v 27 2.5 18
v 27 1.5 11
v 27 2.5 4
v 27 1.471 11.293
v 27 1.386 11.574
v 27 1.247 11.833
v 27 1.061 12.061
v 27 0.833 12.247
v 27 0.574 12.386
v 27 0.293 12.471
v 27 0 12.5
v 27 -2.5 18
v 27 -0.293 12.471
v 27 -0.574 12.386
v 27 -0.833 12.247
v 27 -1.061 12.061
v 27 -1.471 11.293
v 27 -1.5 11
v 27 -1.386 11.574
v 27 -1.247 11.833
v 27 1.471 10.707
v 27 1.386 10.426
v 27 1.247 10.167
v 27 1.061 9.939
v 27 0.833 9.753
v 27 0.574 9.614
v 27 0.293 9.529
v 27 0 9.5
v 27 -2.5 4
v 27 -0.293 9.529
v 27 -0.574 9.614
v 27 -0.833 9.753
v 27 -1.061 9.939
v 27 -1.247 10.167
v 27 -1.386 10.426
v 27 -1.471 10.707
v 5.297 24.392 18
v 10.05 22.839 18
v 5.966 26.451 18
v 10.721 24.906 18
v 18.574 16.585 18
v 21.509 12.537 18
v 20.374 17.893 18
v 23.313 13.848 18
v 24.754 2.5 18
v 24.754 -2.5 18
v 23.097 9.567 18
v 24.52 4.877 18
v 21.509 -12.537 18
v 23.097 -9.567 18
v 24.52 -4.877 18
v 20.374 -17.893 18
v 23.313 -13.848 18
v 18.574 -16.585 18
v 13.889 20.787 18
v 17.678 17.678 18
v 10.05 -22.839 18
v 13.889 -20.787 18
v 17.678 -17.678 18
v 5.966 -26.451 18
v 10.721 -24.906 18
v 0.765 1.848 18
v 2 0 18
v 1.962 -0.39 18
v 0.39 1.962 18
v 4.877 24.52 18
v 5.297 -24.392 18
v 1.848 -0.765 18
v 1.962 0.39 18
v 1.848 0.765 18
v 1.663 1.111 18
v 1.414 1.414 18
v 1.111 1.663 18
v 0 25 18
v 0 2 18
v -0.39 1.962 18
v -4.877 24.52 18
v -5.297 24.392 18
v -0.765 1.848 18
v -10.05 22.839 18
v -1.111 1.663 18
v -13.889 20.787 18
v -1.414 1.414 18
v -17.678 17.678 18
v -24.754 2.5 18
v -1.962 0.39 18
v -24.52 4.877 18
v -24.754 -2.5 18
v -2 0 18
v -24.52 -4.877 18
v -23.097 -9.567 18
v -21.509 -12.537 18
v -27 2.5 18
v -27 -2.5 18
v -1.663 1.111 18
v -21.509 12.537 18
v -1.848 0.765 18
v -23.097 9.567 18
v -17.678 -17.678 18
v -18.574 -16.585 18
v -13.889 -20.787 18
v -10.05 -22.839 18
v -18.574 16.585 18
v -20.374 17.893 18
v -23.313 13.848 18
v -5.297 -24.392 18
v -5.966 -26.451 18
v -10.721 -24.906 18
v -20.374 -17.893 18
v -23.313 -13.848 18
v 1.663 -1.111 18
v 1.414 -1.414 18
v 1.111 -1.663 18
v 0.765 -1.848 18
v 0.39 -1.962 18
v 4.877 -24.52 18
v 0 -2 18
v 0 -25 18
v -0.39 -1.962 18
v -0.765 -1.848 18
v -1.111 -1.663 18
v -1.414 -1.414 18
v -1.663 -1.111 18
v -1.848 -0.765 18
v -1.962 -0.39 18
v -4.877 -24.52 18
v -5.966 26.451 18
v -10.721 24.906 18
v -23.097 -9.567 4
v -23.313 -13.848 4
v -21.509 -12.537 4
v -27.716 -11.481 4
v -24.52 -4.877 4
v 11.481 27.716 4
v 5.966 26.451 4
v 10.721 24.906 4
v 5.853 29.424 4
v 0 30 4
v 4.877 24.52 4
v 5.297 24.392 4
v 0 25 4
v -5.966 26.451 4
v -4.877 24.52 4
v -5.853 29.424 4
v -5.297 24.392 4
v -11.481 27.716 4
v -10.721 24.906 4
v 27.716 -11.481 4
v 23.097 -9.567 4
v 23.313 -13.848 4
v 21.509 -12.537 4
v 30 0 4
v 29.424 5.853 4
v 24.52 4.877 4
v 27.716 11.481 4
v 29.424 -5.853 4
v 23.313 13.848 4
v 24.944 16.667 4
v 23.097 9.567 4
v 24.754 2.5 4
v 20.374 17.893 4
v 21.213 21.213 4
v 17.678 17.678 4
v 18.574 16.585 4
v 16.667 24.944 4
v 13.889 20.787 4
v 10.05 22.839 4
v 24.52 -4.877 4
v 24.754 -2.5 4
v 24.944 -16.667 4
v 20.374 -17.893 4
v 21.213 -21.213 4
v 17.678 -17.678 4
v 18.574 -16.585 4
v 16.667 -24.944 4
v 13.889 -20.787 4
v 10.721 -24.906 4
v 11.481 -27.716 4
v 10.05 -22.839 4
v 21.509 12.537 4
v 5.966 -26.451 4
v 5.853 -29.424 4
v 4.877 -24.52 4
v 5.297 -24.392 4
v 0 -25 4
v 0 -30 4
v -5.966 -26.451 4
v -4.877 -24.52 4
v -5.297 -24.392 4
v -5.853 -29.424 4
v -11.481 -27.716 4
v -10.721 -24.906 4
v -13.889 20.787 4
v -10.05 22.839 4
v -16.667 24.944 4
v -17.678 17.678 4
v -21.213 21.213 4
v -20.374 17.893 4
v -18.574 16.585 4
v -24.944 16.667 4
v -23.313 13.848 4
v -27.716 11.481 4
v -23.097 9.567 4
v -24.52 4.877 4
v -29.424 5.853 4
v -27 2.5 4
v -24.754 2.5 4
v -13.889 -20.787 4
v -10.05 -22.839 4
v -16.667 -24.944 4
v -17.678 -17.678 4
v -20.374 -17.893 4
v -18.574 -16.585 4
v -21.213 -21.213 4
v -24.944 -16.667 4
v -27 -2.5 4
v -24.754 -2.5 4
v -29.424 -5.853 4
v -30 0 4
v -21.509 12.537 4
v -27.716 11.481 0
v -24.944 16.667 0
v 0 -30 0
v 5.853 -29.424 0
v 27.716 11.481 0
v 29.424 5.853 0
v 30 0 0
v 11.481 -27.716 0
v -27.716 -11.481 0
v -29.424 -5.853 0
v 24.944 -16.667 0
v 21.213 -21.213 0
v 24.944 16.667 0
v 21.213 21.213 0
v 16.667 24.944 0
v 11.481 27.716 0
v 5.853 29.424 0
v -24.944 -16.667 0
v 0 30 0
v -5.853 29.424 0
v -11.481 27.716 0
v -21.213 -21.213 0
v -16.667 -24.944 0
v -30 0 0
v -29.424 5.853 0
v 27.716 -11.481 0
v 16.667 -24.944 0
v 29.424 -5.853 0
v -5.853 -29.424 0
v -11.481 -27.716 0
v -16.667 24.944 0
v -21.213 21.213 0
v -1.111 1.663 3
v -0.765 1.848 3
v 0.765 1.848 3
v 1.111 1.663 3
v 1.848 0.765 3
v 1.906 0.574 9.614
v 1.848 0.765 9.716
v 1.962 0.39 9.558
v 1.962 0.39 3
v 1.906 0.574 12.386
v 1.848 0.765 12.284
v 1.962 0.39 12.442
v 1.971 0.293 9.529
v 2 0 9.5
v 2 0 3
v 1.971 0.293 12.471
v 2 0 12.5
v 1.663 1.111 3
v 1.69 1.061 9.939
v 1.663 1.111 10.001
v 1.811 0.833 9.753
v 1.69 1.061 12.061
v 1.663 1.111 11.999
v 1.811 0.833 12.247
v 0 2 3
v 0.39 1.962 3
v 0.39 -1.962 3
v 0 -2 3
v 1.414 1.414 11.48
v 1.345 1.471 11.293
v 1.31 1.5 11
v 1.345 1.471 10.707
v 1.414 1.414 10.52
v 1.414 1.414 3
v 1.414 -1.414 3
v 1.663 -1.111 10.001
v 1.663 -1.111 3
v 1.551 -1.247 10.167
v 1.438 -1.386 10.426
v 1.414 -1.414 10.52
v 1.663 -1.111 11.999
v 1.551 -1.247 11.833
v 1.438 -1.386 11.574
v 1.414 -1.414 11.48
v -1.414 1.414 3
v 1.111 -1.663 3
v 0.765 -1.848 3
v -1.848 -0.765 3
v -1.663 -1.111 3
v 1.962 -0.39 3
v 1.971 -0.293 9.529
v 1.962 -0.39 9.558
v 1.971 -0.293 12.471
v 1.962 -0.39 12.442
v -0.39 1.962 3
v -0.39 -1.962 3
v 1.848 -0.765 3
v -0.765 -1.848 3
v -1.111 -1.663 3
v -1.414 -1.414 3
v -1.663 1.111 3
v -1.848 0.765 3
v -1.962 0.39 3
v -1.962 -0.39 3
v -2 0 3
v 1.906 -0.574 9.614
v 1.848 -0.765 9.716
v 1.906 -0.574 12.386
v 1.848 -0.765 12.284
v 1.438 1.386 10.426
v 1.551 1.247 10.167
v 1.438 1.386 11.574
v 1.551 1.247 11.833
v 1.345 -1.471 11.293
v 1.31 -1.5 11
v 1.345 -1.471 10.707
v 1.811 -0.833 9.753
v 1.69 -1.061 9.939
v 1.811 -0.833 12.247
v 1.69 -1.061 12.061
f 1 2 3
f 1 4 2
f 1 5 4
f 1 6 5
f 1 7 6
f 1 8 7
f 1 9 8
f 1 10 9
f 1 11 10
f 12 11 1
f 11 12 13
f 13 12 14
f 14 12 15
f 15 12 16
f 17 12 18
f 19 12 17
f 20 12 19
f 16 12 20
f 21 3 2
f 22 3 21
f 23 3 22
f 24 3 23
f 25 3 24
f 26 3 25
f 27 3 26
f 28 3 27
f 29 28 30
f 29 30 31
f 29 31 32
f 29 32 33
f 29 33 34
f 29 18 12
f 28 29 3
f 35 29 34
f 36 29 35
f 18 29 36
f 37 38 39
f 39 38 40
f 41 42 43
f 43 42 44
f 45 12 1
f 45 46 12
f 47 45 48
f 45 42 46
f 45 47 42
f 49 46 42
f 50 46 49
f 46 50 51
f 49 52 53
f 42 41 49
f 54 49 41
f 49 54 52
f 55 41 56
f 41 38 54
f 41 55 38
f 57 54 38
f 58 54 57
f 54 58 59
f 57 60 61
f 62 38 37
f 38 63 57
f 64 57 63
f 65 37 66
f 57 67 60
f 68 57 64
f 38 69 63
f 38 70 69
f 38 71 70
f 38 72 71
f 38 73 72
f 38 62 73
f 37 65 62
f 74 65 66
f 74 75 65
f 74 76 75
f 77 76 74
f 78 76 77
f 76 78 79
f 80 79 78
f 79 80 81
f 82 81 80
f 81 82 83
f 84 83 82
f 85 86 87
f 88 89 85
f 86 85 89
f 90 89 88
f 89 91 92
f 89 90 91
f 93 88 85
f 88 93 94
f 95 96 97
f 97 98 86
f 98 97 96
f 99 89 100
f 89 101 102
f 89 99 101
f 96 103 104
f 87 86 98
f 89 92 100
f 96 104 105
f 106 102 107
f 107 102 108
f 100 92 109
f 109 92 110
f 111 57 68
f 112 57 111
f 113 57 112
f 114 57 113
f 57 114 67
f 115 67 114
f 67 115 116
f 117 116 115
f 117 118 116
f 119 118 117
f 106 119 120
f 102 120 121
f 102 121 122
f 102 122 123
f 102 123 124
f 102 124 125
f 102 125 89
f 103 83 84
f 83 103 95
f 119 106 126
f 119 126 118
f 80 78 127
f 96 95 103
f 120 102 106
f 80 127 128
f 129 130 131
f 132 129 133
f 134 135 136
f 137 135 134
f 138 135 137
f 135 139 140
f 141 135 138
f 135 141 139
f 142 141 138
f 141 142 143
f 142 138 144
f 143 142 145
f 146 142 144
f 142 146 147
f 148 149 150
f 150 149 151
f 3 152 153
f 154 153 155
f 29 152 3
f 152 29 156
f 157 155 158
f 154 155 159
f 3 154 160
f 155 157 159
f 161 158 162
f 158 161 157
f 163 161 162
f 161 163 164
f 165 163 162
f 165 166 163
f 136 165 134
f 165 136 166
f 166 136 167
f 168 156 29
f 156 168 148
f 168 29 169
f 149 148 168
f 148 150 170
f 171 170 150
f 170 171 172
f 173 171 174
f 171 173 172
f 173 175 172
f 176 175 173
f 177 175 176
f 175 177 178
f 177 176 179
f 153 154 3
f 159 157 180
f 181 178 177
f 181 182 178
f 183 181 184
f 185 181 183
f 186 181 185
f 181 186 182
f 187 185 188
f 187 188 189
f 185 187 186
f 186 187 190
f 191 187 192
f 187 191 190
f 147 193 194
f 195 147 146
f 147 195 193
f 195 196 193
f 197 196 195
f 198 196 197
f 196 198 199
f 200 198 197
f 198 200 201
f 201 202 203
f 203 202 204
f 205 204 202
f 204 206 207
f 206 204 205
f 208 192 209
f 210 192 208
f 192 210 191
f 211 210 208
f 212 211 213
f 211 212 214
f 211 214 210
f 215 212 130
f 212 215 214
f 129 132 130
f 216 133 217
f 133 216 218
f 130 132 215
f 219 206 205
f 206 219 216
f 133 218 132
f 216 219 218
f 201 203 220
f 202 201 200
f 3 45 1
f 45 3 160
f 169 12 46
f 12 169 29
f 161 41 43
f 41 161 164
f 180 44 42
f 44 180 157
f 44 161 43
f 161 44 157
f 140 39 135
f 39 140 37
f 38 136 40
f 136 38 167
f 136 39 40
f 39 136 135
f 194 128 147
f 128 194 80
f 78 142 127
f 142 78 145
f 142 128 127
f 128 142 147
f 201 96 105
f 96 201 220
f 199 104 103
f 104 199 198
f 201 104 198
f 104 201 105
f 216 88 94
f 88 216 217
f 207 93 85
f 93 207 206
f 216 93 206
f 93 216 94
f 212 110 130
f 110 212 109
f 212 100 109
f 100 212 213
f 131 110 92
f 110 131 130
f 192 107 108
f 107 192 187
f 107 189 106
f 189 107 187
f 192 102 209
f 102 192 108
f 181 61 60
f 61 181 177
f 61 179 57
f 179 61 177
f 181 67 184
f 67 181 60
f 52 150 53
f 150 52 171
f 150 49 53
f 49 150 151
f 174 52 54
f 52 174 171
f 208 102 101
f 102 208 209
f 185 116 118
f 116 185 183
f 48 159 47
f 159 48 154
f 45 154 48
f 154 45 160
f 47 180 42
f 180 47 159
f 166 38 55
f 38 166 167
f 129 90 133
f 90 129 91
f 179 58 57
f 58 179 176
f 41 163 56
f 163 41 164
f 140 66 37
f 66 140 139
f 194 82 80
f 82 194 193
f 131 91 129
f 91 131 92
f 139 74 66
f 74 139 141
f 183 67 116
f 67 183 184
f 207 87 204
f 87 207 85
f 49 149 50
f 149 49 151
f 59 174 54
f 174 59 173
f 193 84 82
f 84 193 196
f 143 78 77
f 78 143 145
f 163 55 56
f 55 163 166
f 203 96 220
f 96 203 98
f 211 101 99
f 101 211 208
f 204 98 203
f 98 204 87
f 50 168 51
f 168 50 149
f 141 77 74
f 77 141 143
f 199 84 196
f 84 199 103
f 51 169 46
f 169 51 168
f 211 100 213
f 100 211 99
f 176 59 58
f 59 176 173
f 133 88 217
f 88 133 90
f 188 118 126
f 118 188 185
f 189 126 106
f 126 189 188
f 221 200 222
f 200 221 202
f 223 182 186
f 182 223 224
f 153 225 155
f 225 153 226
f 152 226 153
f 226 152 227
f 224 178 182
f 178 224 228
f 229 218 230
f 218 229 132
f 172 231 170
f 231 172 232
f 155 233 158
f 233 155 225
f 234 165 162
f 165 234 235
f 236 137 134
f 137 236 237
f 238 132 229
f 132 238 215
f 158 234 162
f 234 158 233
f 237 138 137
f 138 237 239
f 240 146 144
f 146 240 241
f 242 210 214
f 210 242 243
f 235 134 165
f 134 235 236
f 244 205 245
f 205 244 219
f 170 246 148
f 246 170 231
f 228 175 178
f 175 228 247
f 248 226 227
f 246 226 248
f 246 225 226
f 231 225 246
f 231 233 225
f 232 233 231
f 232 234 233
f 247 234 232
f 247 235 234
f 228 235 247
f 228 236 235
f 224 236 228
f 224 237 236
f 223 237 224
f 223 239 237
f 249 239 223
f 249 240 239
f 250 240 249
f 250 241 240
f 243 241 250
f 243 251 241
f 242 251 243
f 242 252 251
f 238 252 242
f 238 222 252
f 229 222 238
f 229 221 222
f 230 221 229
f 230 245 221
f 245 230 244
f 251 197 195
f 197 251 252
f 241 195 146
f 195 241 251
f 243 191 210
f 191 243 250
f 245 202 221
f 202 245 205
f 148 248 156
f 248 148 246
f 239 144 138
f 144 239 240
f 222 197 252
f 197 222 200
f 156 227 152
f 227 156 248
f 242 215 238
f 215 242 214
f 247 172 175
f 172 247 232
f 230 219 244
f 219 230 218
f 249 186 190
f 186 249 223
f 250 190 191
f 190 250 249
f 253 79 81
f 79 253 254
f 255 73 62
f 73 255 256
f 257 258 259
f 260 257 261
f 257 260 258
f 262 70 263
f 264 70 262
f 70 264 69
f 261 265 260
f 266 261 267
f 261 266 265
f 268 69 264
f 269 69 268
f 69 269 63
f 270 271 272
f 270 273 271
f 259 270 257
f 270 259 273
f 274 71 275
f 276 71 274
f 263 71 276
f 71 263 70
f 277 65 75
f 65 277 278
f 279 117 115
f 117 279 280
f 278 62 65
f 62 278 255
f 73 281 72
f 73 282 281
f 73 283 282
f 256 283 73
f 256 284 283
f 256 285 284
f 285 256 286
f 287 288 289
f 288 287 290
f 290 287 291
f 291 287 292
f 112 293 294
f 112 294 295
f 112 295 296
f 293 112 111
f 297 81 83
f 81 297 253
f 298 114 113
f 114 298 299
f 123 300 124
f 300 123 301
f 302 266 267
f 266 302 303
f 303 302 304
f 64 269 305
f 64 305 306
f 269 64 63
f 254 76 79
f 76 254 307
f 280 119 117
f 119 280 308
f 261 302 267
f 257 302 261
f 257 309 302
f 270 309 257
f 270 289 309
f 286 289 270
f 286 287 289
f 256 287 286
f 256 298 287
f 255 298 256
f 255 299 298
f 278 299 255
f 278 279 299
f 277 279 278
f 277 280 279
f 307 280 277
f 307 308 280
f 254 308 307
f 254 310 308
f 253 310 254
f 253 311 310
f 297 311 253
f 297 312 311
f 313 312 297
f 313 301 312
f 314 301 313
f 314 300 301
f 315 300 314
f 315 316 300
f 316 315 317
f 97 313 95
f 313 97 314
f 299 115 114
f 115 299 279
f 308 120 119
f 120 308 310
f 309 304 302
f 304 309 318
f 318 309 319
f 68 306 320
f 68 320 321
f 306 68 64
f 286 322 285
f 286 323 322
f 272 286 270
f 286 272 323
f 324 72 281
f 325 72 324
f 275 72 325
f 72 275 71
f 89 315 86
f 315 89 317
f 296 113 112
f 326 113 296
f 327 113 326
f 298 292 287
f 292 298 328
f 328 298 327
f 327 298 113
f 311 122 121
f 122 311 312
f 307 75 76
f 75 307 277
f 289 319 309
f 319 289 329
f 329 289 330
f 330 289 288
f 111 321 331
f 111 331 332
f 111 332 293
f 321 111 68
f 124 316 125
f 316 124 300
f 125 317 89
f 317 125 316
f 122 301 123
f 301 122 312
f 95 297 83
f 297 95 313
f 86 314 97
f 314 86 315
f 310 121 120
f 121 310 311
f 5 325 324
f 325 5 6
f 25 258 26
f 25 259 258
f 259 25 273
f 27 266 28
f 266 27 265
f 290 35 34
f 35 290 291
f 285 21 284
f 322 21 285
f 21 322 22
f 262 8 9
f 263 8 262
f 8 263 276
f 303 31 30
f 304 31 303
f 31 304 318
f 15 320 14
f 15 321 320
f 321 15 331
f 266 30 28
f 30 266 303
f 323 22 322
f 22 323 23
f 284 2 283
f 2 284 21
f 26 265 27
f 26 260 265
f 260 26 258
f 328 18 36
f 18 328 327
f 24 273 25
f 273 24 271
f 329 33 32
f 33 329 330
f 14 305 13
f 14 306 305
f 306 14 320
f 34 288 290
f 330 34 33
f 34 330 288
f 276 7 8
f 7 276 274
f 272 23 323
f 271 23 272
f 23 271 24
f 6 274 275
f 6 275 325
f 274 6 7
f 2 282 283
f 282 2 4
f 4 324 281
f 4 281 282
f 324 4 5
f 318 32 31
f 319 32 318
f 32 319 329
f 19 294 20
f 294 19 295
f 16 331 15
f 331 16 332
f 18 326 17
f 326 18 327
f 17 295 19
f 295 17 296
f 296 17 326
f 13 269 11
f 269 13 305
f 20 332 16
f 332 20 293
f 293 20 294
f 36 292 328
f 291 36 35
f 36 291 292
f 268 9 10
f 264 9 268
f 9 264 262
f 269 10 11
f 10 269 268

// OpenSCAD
$fn = 32;

// ----------------------------------------------------------------------
// Control knob: skirt knob with grip ribs
// ----------------------------------------------------------------------

// --- parameters (mm) ---
skirt_d = 60;             // skirt diameter
skirt_t = 4;              // skirt thickness
rib_w = 5;                // grip rib width
rib_out = 3;              // grip rib radial protrusion
n_ribs = 10;              // number of grip ribs
knob_d = 50;              // knob body diameter
knob_h = 14;              // knob body height
bore_d = 4;               // shaft bore diameter
set_d = 3;                // set screw bore diameter

rib_step = 360 / n_ribs;  // rib angular step
total_h = skirt_t + knob_h;  // overall height

difference() {
  union() {
    translate([0, 0, skirt_t]) cylinder(h = knob_h, d = knob_d);
    cylinder(h = skirt_t, d = skirt_d);
    for (i = [0 : n_ribs - 1])
      rotate([0, 0, i * rib_step])
        translate([knob_d / 2 - 1, -rib_w / 2, skirt_t])
          cube([rib_out, rib_w, knob_h]);
  }
  translate([0, 0, skirt_t - 1]) cylinder(h = knob_h + 2, d = bore_d);
  translate([-1, 0, skirt_t + knob_h / 2]) rotate([0, 90, 0])
    cylinder(h = knob_d / 2 + bore_d / 2 + 2, d = set_d);
}
